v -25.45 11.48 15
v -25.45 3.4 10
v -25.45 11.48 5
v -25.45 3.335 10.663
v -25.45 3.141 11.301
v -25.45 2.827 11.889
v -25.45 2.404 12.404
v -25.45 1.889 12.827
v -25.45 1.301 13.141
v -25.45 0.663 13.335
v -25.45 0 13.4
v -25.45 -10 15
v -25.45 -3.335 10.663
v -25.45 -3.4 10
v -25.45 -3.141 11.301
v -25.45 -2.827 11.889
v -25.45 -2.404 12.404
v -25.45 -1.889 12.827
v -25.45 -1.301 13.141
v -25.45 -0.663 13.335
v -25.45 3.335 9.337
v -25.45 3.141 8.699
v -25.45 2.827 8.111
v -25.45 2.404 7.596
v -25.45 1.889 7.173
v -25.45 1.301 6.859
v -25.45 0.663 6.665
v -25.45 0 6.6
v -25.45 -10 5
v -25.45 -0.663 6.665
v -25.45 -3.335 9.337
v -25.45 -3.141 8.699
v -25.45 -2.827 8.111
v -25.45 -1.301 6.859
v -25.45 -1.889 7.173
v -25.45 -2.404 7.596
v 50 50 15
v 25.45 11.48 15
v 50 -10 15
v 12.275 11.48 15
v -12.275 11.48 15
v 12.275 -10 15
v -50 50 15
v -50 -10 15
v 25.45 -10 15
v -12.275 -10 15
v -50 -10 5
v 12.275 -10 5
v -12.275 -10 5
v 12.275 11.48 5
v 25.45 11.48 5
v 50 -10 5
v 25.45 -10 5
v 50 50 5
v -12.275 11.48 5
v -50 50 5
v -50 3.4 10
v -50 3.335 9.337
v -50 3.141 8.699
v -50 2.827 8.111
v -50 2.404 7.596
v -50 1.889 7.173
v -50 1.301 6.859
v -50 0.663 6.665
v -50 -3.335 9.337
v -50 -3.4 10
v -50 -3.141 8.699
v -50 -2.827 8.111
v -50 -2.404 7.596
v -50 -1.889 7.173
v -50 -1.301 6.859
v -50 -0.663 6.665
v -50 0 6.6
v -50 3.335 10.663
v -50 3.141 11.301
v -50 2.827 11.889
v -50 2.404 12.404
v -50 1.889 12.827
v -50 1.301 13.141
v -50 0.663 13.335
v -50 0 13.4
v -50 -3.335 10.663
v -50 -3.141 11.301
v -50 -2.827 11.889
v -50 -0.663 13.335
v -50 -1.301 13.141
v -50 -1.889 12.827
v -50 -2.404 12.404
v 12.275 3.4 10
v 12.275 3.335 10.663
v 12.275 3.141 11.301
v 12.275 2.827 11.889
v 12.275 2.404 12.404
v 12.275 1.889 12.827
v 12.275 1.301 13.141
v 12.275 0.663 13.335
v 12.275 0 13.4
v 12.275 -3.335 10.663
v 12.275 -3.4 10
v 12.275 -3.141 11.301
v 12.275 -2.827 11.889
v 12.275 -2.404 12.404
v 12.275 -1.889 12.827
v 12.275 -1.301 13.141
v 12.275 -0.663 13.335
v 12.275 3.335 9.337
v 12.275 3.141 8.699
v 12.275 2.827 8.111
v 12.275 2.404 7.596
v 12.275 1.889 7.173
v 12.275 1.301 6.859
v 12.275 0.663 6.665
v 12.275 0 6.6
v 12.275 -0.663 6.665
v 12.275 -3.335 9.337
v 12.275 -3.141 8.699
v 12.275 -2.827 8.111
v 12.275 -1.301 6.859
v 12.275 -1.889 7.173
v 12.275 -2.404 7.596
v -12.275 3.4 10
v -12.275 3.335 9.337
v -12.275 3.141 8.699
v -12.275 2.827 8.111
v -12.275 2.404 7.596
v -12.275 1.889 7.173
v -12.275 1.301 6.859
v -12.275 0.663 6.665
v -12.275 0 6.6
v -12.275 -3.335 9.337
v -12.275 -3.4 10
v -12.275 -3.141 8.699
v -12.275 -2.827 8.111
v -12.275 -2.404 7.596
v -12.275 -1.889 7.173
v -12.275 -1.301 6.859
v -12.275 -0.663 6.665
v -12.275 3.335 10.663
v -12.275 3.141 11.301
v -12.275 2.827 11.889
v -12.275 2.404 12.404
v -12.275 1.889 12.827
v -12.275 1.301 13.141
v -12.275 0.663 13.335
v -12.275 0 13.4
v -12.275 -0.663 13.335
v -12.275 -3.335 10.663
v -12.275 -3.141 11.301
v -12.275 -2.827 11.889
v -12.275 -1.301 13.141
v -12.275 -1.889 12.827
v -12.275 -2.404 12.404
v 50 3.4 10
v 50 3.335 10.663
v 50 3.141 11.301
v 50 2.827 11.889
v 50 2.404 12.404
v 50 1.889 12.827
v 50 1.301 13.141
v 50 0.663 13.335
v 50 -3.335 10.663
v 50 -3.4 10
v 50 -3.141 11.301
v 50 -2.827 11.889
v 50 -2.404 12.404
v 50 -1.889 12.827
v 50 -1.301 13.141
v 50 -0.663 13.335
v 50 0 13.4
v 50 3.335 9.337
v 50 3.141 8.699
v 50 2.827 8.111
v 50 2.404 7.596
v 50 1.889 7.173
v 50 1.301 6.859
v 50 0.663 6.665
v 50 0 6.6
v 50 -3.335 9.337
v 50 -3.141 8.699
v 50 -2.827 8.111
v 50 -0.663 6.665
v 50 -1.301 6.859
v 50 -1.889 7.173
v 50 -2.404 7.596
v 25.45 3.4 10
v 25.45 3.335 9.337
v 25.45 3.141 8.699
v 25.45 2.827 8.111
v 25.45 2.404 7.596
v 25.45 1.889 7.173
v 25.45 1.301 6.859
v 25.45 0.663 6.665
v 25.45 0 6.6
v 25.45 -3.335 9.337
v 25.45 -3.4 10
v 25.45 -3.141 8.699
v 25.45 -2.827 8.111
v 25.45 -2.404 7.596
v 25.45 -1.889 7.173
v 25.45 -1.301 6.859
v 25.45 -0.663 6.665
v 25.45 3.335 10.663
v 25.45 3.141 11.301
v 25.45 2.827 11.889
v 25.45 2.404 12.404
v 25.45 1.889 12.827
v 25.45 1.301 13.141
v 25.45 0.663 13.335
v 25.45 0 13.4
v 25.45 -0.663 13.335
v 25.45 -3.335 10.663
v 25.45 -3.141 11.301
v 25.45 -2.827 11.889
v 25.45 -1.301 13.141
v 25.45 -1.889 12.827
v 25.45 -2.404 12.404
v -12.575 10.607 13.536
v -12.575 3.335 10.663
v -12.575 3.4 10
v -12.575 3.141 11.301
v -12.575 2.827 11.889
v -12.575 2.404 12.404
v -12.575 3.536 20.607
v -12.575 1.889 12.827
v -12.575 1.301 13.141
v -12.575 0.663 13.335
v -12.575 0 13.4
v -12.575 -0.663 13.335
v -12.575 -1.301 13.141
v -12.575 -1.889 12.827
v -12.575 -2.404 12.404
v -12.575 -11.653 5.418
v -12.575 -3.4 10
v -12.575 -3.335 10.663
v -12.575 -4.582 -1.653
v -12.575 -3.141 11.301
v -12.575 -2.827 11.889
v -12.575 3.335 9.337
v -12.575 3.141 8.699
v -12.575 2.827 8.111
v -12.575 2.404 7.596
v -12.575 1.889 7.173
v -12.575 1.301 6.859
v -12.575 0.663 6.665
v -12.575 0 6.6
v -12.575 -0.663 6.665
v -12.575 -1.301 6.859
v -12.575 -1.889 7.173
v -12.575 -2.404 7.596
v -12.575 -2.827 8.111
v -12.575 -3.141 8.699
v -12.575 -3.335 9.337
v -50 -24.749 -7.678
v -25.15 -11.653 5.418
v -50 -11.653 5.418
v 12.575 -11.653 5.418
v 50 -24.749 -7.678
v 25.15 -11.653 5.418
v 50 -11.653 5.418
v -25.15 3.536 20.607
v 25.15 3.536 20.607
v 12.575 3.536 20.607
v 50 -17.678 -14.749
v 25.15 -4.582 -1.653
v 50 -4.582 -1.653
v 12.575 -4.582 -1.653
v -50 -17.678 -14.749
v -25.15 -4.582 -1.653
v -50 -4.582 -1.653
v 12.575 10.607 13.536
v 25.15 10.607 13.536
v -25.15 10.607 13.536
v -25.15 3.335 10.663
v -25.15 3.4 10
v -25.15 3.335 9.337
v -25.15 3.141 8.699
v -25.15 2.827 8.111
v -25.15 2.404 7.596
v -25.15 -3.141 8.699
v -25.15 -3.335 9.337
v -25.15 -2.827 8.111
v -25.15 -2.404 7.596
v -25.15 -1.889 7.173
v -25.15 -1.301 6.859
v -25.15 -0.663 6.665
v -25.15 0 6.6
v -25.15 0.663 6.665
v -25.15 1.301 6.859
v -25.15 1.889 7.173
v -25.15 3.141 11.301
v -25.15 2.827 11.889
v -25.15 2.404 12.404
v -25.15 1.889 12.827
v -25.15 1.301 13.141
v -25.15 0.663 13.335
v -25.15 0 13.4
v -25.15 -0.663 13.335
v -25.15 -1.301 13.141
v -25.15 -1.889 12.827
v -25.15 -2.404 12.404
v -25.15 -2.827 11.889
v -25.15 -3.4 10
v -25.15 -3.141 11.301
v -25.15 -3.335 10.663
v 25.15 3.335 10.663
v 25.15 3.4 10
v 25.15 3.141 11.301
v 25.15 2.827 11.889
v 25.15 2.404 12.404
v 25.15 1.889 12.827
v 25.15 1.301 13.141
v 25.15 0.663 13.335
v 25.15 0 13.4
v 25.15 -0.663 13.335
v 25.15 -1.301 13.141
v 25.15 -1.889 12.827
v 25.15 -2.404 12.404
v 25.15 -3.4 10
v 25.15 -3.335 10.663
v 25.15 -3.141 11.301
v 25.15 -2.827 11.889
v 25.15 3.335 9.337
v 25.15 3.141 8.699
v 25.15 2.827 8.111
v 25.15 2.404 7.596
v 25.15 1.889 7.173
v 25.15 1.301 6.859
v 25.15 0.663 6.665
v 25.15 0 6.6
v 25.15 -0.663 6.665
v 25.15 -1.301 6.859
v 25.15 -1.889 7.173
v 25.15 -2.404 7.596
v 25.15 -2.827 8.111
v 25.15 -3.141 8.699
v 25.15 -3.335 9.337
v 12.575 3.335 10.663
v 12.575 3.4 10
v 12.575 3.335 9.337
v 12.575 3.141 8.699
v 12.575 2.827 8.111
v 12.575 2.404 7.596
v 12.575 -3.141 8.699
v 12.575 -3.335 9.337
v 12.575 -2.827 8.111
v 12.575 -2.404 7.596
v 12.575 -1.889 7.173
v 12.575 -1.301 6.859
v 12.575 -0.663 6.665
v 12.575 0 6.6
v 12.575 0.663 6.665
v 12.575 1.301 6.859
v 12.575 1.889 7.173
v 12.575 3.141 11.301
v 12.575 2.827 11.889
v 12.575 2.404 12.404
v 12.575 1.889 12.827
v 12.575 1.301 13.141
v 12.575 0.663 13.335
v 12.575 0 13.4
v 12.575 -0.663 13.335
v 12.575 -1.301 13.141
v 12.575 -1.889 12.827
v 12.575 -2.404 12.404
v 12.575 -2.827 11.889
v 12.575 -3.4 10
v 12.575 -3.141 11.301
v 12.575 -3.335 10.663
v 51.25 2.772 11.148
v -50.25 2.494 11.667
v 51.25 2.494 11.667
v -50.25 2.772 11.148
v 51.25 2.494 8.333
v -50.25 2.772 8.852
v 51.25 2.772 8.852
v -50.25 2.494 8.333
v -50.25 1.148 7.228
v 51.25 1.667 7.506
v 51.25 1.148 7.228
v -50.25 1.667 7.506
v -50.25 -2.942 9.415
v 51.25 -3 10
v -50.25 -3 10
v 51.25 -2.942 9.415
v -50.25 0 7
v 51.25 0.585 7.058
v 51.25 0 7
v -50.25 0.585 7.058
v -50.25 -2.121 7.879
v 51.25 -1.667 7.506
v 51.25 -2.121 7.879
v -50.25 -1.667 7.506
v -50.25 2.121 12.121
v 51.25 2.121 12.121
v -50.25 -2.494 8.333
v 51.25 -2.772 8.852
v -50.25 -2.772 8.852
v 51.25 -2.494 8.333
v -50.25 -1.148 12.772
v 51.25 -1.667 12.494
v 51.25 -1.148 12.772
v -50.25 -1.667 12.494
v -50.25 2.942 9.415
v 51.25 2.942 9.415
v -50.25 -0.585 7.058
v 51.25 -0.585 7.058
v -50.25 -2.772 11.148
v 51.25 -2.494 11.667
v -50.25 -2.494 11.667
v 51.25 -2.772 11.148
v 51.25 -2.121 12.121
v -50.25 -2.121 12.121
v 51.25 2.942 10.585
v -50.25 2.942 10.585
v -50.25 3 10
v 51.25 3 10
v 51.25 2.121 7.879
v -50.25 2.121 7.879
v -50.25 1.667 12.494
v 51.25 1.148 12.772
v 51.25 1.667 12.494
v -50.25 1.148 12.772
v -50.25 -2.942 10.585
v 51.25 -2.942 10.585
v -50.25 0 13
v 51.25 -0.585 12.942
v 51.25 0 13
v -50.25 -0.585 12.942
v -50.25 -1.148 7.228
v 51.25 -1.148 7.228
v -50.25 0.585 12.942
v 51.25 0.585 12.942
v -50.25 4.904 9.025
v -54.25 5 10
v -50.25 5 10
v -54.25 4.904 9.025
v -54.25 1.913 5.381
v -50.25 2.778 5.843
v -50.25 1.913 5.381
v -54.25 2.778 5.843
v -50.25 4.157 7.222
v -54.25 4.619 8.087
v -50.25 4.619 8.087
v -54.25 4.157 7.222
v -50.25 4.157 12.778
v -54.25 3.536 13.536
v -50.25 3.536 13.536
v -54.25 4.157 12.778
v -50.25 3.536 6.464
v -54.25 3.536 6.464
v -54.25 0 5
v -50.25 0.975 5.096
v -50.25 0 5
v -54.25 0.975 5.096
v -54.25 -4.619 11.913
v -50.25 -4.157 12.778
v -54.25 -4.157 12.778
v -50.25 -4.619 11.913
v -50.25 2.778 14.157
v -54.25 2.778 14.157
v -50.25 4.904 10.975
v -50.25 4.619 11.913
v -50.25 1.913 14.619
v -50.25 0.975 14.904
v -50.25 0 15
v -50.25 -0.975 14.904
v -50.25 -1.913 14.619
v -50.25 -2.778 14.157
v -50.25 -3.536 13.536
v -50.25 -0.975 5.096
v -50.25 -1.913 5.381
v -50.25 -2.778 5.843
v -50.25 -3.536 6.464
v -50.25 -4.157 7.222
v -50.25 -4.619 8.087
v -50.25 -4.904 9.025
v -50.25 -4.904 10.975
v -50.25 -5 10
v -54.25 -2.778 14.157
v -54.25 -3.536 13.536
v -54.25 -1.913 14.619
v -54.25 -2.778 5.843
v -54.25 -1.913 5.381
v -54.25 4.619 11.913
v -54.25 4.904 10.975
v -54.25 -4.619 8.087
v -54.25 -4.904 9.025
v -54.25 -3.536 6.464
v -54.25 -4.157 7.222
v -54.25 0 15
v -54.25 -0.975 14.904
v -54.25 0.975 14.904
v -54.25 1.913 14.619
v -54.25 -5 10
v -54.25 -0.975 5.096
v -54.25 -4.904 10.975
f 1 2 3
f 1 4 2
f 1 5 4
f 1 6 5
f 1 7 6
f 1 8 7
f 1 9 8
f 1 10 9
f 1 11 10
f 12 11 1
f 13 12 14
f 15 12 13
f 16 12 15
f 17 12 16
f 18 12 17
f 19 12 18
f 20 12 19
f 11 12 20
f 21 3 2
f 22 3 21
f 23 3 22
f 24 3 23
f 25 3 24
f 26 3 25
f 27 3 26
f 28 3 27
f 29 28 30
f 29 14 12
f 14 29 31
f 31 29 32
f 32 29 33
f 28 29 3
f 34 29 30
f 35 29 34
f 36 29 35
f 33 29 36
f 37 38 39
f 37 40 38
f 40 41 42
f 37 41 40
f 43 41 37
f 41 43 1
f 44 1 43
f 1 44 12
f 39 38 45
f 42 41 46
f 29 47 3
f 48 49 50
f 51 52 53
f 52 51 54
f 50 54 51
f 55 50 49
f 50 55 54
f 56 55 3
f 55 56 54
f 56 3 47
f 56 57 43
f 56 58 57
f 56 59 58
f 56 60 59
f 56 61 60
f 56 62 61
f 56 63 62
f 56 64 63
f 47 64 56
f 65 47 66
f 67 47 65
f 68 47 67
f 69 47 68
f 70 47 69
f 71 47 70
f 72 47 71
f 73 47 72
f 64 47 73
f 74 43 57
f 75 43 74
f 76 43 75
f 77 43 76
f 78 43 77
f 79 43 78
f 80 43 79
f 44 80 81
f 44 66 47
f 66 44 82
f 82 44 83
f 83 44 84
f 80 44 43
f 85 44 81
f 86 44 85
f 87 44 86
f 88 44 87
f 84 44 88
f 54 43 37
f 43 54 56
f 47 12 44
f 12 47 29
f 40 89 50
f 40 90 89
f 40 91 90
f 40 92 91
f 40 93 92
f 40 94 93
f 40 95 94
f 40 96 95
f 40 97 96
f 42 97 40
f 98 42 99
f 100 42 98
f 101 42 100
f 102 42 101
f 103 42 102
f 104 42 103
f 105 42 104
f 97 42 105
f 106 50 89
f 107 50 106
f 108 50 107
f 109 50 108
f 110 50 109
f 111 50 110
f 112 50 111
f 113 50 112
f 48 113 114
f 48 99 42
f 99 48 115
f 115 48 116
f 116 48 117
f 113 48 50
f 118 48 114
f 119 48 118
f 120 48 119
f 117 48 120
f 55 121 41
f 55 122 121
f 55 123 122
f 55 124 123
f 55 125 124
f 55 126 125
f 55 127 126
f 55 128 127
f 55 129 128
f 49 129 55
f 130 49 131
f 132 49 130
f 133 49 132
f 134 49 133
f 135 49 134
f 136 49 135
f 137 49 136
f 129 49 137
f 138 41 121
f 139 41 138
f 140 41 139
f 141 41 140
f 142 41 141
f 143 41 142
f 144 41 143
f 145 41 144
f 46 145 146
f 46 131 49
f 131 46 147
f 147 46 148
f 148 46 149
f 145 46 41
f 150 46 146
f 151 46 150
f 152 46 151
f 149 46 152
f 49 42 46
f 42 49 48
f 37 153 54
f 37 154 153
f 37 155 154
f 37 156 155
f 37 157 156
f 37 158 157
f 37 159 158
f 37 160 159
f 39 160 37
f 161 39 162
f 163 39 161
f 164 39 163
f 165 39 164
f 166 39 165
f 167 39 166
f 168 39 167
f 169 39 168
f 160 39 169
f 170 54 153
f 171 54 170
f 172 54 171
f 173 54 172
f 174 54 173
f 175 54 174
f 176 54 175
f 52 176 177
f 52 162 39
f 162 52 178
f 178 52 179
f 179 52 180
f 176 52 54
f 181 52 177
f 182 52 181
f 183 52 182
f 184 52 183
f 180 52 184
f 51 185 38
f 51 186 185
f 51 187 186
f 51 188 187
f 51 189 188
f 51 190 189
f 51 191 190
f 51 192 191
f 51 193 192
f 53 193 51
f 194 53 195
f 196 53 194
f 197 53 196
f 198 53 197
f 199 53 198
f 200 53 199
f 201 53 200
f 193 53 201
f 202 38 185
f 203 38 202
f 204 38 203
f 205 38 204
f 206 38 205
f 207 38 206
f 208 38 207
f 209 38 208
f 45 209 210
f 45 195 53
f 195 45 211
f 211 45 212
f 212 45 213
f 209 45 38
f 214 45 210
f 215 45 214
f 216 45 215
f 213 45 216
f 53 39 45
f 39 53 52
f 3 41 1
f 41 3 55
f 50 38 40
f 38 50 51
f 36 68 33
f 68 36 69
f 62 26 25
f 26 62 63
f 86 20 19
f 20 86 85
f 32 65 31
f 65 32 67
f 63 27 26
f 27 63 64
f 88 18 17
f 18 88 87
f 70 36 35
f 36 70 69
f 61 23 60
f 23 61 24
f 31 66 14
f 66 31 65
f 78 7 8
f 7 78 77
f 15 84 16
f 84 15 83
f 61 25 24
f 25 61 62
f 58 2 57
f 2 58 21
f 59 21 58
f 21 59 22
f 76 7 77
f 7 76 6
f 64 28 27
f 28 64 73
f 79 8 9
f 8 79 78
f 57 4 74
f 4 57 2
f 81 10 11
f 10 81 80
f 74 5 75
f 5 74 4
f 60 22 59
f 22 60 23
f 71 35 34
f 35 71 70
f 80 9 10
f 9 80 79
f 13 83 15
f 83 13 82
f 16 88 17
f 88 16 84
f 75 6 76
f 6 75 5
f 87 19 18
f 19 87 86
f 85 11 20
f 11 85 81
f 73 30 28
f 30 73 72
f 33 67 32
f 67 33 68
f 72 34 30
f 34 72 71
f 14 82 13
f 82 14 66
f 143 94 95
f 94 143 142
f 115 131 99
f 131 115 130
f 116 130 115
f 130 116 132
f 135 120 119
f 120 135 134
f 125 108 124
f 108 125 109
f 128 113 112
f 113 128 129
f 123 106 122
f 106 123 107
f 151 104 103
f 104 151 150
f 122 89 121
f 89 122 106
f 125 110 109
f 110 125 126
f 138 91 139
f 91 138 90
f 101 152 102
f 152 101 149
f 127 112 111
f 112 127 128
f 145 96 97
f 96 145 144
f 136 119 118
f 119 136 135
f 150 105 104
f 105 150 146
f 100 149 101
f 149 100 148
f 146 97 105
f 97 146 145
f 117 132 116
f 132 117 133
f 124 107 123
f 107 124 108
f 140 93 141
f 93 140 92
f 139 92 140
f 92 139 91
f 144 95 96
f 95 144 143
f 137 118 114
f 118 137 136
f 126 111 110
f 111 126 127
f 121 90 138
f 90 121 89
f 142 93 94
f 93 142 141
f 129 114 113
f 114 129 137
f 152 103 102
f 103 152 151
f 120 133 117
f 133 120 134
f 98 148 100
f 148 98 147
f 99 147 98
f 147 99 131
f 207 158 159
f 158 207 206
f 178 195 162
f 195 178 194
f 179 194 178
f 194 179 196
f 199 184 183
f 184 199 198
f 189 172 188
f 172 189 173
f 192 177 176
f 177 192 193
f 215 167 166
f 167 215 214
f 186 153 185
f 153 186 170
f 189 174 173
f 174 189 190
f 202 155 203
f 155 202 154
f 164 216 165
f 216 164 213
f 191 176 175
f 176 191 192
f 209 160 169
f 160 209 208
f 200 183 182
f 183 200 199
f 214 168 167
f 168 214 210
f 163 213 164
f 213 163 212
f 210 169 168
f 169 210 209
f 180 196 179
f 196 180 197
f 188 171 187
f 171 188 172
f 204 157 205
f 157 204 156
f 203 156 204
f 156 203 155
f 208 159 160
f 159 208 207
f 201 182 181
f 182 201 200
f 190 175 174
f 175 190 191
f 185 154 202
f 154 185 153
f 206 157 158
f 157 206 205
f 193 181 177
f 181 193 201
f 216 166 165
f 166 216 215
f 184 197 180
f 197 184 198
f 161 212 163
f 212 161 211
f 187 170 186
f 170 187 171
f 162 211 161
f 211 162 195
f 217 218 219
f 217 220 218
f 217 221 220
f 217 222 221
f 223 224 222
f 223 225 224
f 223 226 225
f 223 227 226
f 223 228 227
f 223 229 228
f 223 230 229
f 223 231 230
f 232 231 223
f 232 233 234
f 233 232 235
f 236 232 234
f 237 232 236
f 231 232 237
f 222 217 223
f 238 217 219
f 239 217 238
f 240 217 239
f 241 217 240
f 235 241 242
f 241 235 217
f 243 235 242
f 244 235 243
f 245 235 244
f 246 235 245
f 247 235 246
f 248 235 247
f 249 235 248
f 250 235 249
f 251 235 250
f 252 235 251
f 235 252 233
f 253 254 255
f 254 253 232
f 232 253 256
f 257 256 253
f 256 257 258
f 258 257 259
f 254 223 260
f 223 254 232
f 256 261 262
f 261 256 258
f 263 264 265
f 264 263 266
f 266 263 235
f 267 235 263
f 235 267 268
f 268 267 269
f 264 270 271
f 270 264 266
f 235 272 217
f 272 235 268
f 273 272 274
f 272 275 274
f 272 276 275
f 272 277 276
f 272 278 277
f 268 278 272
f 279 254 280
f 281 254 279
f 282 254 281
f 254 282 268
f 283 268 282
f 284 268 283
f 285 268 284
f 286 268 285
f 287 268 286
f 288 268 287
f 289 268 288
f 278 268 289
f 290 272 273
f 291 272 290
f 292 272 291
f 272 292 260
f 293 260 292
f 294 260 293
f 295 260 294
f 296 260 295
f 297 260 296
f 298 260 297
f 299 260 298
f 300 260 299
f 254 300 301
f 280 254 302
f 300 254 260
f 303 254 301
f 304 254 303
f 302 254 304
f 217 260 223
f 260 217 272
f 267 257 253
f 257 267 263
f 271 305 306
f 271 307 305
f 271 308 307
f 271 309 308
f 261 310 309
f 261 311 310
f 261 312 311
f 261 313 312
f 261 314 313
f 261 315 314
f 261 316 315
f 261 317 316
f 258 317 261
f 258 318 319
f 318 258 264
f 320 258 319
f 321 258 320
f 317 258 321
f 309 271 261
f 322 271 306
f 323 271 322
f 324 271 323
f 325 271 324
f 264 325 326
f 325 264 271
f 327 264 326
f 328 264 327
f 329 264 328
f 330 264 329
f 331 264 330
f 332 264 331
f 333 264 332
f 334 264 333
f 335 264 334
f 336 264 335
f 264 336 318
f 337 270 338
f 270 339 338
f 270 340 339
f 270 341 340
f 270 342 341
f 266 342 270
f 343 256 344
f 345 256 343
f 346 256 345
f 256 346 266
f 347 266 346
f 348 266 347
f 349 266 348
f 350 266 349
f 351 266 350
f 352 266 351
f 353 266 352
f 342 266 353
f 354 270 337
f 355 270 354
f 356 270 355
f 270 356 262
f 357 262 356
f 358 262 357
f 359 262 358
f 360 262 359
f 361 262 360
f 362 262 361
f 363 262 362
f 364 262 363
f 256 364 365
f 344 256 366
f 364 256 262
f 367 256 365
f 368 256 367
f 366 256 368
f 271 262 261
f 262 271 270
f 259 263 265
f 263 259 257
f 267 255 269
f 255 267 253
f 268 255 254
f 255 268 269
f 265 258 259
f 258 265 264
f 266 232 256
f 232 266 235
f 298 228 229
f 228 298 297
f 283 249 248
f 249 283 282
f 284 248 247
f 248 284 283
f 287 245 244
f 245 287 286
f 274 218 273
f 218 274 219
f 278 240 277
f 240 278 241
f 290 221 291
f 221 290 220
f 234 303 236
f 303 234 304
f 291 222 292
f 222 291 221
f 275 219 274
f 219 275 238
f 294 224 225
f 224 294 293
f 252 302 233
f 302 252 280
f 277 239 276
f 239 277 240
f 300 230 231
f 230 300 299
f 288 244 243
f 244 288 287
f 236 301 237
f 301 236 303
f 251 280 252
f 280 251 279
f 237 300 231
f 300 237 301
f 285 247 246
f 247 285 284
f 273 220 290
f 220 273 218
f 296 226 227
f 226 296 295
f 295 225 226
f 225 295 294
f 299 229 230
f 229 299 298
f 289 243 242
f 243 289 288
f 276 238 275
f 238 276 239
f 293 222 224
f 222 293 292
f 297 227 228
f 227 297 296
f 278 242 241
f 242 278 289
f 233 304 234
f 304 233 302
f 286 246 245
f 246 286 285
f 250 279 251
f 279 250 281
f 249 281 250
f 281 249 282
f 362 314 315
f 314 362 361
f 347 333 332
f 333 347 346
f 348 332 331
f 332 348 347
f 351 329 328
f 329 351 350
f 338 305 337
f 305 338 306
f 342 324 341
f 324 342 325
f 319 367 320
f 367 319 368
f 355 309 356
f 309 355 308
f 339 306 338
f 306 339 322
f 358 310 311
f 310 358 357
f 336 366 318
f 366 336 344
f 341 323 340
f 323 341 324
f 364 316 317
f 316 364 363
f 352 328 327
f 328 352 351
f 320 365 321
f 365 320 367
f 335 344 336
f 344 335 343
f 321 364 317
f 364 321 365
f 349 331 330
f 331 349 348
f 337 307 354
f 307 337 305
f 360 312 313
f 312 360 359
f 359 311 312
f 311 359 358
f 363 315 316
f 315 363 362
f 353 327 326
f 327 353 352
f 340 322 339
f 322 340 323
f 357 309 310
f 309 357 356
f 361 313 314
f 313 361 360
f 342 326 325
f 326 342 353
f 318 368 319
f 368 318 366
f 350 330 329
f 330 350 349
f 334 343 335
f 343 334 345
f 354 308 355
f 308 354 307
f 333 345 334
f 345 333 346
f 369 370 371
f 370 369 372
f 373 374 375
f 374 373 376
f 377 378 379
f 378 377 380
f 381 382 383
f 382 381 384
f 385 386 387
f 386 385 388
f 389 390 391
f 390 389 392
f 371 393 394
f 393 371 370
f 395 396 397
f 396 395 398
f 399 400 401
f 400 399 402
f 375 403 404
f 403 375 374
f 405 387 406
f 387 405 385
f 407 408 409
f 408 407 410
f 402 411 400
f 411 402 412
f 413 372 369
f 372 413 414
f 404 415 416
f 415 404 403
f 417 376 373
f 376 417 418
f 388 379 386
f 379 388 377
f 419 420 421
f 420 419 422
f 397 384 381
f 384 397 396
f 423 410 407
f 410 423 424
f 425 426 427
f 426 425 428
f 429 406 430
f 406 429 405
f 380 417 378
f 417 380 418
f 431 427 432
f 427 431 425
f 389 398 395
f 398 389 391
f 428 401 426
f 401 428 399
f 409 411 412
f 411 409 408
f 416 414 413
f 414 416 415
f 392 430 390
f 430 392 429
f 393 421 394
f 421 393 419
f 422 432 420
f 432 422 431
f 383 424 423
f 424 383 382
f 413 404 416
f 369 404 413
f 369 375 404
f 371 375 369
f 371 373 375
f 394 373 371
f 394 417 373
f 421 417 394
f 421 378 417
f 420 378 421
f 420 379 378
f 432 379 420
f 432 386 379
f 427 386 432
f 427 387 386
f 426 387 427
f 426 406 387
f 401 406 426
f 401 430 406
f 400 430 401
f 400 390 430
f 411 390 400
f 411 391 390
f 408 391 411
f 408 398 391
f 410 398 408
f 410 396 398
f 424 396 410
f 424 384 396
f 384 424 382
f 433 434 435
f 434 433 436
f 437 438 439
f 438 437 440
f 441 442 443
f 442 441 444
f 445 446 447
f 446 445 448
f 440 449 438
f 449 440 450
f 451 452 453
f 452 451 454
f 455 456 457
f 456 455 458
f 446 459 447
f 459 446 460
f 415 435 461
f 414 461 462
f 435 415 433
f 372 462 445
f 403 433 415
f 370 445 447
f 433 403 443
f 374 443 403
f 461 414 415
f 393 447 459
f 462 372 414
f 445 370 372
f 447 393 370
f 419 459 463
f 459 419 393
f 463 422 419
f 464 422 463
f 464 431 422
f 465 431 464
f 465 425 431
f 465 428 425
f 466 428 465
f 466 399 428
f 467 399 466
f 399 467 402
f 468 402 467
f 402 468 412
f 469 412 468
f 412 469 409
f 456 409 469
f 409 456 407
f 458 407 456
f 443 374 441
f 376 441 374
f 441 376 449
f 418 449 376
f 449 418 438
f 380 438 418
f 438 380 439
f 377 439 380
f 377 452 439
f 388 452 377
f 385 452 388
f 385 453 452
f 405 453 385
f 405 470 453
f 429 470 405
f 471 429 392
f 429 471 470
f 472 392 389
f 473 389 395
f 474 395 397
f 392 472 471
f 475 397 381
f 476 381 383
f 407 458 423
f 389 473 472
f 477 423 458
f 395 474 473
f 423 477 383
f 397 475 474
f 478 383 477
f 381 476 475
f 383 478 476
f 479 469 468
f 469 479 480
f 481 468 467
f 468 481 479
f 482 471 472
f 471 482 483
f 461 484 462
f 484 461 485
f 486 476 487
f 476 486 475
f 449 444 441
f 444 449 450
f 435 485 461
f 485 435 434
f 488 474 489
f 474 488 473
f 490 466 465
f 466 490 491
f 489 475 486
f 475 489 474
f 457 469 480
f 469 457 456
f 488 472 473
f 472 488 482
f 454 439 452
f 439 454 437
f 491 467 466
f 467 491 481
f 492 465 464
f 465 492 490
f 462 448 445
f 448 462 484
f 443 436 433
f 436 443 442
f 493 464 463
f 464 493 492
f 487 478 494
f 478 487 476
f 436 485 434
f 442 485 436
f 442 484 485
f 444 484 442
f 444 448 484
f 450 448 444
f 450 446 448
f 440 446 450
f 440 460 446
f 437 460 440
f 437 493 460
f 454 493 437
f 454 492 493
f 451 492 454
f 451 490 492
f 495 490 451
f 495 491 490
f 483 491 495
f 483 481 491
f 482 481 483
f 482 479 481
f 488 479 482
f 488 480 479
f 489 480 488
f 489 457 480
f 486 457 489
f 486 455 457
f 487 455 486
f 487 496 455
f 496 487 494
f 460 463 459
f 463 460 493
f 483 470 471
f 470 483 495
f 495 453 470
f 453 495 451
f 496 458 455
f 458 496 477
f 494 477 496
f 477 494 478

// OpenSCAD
$fn = 32;

// ------------------------------------------------------------------------
// Butt hinge: hinge 100 mm, leaf swung 45 deg
// Every part is its own module, assembly() places every instance.
// ------------------------------------------------------------------------

// --- part 1 ---
module hinge_base() {
  difference() {
    union() {
      translate([-50, -10, -5]) cube([24.55, 60, 10]);
      translate([-12.275, -10, -5]) cube([24.55, 60, 10]);
      translate([25.45, -10, -5]) cube([24.55, 60, 10]);
      translate([-50, 11.48, -5]) cube([100, 38.52, 10]);
    }
    translate([-37.725, 0, 0]) rotate([0, 90, 0]) cylinder(h = 26.55, d = 6.8, center = true);
    translate([0, 0, 0]) rotate([0, 90, 0]) cylinder(h = 26.55, d = 6.8, center = true);
    translate([37.725, 0, 0]) rotate([0, 90, 0]) cylinder(h = 26.55, d = 6.8, center = true);
  }
}

// --- part 2 ---
module hinge_mover() {
  difference() {
    union() {
      translate([-25.15, -30, -5]) cube([12.575, 40, 10]);
      translate([12.575, -30, -5]) cube([12.575, 40, 10]);
      translate([-50, -30, -5]) cube([100, 18.52, 10]);
    }
    translate([-18.863, 0, 0]) rotate([0, 90, 0]) cylinder(h = 14.575, d = 6.8, center = true);
    translate([18.863, 0, 0]) rotate([0, 90, 0]) cylinder(h = 14.575, d = 6.8, center = true);
  }
}

// --- part 3 ---
module hinge_pin() {
  rotate([0, 90, 0]) cylinder(h = 102.5, d = 6, center = true);
  translate([-54.25, 0, 0]) rotate([0, 90, 0]) cylinder(h = 4, d = 10);
}

// --- assembly ---
module assembly() {
  color([0.80, 0.24, 0.20]) translate([0, 0, 10]) rotate([0, 0, 0]) hinge_base();
  color([0.20, 0.45, 0.75]) translate([0, 0, 10]) rotate([45, 0, 0]) hinge_mover();
  color([0.25, 0.62, 0.32]) translate([0, 0, 10]) rotate([0, 0, 0]) hinge_pin();
}

assembly();
